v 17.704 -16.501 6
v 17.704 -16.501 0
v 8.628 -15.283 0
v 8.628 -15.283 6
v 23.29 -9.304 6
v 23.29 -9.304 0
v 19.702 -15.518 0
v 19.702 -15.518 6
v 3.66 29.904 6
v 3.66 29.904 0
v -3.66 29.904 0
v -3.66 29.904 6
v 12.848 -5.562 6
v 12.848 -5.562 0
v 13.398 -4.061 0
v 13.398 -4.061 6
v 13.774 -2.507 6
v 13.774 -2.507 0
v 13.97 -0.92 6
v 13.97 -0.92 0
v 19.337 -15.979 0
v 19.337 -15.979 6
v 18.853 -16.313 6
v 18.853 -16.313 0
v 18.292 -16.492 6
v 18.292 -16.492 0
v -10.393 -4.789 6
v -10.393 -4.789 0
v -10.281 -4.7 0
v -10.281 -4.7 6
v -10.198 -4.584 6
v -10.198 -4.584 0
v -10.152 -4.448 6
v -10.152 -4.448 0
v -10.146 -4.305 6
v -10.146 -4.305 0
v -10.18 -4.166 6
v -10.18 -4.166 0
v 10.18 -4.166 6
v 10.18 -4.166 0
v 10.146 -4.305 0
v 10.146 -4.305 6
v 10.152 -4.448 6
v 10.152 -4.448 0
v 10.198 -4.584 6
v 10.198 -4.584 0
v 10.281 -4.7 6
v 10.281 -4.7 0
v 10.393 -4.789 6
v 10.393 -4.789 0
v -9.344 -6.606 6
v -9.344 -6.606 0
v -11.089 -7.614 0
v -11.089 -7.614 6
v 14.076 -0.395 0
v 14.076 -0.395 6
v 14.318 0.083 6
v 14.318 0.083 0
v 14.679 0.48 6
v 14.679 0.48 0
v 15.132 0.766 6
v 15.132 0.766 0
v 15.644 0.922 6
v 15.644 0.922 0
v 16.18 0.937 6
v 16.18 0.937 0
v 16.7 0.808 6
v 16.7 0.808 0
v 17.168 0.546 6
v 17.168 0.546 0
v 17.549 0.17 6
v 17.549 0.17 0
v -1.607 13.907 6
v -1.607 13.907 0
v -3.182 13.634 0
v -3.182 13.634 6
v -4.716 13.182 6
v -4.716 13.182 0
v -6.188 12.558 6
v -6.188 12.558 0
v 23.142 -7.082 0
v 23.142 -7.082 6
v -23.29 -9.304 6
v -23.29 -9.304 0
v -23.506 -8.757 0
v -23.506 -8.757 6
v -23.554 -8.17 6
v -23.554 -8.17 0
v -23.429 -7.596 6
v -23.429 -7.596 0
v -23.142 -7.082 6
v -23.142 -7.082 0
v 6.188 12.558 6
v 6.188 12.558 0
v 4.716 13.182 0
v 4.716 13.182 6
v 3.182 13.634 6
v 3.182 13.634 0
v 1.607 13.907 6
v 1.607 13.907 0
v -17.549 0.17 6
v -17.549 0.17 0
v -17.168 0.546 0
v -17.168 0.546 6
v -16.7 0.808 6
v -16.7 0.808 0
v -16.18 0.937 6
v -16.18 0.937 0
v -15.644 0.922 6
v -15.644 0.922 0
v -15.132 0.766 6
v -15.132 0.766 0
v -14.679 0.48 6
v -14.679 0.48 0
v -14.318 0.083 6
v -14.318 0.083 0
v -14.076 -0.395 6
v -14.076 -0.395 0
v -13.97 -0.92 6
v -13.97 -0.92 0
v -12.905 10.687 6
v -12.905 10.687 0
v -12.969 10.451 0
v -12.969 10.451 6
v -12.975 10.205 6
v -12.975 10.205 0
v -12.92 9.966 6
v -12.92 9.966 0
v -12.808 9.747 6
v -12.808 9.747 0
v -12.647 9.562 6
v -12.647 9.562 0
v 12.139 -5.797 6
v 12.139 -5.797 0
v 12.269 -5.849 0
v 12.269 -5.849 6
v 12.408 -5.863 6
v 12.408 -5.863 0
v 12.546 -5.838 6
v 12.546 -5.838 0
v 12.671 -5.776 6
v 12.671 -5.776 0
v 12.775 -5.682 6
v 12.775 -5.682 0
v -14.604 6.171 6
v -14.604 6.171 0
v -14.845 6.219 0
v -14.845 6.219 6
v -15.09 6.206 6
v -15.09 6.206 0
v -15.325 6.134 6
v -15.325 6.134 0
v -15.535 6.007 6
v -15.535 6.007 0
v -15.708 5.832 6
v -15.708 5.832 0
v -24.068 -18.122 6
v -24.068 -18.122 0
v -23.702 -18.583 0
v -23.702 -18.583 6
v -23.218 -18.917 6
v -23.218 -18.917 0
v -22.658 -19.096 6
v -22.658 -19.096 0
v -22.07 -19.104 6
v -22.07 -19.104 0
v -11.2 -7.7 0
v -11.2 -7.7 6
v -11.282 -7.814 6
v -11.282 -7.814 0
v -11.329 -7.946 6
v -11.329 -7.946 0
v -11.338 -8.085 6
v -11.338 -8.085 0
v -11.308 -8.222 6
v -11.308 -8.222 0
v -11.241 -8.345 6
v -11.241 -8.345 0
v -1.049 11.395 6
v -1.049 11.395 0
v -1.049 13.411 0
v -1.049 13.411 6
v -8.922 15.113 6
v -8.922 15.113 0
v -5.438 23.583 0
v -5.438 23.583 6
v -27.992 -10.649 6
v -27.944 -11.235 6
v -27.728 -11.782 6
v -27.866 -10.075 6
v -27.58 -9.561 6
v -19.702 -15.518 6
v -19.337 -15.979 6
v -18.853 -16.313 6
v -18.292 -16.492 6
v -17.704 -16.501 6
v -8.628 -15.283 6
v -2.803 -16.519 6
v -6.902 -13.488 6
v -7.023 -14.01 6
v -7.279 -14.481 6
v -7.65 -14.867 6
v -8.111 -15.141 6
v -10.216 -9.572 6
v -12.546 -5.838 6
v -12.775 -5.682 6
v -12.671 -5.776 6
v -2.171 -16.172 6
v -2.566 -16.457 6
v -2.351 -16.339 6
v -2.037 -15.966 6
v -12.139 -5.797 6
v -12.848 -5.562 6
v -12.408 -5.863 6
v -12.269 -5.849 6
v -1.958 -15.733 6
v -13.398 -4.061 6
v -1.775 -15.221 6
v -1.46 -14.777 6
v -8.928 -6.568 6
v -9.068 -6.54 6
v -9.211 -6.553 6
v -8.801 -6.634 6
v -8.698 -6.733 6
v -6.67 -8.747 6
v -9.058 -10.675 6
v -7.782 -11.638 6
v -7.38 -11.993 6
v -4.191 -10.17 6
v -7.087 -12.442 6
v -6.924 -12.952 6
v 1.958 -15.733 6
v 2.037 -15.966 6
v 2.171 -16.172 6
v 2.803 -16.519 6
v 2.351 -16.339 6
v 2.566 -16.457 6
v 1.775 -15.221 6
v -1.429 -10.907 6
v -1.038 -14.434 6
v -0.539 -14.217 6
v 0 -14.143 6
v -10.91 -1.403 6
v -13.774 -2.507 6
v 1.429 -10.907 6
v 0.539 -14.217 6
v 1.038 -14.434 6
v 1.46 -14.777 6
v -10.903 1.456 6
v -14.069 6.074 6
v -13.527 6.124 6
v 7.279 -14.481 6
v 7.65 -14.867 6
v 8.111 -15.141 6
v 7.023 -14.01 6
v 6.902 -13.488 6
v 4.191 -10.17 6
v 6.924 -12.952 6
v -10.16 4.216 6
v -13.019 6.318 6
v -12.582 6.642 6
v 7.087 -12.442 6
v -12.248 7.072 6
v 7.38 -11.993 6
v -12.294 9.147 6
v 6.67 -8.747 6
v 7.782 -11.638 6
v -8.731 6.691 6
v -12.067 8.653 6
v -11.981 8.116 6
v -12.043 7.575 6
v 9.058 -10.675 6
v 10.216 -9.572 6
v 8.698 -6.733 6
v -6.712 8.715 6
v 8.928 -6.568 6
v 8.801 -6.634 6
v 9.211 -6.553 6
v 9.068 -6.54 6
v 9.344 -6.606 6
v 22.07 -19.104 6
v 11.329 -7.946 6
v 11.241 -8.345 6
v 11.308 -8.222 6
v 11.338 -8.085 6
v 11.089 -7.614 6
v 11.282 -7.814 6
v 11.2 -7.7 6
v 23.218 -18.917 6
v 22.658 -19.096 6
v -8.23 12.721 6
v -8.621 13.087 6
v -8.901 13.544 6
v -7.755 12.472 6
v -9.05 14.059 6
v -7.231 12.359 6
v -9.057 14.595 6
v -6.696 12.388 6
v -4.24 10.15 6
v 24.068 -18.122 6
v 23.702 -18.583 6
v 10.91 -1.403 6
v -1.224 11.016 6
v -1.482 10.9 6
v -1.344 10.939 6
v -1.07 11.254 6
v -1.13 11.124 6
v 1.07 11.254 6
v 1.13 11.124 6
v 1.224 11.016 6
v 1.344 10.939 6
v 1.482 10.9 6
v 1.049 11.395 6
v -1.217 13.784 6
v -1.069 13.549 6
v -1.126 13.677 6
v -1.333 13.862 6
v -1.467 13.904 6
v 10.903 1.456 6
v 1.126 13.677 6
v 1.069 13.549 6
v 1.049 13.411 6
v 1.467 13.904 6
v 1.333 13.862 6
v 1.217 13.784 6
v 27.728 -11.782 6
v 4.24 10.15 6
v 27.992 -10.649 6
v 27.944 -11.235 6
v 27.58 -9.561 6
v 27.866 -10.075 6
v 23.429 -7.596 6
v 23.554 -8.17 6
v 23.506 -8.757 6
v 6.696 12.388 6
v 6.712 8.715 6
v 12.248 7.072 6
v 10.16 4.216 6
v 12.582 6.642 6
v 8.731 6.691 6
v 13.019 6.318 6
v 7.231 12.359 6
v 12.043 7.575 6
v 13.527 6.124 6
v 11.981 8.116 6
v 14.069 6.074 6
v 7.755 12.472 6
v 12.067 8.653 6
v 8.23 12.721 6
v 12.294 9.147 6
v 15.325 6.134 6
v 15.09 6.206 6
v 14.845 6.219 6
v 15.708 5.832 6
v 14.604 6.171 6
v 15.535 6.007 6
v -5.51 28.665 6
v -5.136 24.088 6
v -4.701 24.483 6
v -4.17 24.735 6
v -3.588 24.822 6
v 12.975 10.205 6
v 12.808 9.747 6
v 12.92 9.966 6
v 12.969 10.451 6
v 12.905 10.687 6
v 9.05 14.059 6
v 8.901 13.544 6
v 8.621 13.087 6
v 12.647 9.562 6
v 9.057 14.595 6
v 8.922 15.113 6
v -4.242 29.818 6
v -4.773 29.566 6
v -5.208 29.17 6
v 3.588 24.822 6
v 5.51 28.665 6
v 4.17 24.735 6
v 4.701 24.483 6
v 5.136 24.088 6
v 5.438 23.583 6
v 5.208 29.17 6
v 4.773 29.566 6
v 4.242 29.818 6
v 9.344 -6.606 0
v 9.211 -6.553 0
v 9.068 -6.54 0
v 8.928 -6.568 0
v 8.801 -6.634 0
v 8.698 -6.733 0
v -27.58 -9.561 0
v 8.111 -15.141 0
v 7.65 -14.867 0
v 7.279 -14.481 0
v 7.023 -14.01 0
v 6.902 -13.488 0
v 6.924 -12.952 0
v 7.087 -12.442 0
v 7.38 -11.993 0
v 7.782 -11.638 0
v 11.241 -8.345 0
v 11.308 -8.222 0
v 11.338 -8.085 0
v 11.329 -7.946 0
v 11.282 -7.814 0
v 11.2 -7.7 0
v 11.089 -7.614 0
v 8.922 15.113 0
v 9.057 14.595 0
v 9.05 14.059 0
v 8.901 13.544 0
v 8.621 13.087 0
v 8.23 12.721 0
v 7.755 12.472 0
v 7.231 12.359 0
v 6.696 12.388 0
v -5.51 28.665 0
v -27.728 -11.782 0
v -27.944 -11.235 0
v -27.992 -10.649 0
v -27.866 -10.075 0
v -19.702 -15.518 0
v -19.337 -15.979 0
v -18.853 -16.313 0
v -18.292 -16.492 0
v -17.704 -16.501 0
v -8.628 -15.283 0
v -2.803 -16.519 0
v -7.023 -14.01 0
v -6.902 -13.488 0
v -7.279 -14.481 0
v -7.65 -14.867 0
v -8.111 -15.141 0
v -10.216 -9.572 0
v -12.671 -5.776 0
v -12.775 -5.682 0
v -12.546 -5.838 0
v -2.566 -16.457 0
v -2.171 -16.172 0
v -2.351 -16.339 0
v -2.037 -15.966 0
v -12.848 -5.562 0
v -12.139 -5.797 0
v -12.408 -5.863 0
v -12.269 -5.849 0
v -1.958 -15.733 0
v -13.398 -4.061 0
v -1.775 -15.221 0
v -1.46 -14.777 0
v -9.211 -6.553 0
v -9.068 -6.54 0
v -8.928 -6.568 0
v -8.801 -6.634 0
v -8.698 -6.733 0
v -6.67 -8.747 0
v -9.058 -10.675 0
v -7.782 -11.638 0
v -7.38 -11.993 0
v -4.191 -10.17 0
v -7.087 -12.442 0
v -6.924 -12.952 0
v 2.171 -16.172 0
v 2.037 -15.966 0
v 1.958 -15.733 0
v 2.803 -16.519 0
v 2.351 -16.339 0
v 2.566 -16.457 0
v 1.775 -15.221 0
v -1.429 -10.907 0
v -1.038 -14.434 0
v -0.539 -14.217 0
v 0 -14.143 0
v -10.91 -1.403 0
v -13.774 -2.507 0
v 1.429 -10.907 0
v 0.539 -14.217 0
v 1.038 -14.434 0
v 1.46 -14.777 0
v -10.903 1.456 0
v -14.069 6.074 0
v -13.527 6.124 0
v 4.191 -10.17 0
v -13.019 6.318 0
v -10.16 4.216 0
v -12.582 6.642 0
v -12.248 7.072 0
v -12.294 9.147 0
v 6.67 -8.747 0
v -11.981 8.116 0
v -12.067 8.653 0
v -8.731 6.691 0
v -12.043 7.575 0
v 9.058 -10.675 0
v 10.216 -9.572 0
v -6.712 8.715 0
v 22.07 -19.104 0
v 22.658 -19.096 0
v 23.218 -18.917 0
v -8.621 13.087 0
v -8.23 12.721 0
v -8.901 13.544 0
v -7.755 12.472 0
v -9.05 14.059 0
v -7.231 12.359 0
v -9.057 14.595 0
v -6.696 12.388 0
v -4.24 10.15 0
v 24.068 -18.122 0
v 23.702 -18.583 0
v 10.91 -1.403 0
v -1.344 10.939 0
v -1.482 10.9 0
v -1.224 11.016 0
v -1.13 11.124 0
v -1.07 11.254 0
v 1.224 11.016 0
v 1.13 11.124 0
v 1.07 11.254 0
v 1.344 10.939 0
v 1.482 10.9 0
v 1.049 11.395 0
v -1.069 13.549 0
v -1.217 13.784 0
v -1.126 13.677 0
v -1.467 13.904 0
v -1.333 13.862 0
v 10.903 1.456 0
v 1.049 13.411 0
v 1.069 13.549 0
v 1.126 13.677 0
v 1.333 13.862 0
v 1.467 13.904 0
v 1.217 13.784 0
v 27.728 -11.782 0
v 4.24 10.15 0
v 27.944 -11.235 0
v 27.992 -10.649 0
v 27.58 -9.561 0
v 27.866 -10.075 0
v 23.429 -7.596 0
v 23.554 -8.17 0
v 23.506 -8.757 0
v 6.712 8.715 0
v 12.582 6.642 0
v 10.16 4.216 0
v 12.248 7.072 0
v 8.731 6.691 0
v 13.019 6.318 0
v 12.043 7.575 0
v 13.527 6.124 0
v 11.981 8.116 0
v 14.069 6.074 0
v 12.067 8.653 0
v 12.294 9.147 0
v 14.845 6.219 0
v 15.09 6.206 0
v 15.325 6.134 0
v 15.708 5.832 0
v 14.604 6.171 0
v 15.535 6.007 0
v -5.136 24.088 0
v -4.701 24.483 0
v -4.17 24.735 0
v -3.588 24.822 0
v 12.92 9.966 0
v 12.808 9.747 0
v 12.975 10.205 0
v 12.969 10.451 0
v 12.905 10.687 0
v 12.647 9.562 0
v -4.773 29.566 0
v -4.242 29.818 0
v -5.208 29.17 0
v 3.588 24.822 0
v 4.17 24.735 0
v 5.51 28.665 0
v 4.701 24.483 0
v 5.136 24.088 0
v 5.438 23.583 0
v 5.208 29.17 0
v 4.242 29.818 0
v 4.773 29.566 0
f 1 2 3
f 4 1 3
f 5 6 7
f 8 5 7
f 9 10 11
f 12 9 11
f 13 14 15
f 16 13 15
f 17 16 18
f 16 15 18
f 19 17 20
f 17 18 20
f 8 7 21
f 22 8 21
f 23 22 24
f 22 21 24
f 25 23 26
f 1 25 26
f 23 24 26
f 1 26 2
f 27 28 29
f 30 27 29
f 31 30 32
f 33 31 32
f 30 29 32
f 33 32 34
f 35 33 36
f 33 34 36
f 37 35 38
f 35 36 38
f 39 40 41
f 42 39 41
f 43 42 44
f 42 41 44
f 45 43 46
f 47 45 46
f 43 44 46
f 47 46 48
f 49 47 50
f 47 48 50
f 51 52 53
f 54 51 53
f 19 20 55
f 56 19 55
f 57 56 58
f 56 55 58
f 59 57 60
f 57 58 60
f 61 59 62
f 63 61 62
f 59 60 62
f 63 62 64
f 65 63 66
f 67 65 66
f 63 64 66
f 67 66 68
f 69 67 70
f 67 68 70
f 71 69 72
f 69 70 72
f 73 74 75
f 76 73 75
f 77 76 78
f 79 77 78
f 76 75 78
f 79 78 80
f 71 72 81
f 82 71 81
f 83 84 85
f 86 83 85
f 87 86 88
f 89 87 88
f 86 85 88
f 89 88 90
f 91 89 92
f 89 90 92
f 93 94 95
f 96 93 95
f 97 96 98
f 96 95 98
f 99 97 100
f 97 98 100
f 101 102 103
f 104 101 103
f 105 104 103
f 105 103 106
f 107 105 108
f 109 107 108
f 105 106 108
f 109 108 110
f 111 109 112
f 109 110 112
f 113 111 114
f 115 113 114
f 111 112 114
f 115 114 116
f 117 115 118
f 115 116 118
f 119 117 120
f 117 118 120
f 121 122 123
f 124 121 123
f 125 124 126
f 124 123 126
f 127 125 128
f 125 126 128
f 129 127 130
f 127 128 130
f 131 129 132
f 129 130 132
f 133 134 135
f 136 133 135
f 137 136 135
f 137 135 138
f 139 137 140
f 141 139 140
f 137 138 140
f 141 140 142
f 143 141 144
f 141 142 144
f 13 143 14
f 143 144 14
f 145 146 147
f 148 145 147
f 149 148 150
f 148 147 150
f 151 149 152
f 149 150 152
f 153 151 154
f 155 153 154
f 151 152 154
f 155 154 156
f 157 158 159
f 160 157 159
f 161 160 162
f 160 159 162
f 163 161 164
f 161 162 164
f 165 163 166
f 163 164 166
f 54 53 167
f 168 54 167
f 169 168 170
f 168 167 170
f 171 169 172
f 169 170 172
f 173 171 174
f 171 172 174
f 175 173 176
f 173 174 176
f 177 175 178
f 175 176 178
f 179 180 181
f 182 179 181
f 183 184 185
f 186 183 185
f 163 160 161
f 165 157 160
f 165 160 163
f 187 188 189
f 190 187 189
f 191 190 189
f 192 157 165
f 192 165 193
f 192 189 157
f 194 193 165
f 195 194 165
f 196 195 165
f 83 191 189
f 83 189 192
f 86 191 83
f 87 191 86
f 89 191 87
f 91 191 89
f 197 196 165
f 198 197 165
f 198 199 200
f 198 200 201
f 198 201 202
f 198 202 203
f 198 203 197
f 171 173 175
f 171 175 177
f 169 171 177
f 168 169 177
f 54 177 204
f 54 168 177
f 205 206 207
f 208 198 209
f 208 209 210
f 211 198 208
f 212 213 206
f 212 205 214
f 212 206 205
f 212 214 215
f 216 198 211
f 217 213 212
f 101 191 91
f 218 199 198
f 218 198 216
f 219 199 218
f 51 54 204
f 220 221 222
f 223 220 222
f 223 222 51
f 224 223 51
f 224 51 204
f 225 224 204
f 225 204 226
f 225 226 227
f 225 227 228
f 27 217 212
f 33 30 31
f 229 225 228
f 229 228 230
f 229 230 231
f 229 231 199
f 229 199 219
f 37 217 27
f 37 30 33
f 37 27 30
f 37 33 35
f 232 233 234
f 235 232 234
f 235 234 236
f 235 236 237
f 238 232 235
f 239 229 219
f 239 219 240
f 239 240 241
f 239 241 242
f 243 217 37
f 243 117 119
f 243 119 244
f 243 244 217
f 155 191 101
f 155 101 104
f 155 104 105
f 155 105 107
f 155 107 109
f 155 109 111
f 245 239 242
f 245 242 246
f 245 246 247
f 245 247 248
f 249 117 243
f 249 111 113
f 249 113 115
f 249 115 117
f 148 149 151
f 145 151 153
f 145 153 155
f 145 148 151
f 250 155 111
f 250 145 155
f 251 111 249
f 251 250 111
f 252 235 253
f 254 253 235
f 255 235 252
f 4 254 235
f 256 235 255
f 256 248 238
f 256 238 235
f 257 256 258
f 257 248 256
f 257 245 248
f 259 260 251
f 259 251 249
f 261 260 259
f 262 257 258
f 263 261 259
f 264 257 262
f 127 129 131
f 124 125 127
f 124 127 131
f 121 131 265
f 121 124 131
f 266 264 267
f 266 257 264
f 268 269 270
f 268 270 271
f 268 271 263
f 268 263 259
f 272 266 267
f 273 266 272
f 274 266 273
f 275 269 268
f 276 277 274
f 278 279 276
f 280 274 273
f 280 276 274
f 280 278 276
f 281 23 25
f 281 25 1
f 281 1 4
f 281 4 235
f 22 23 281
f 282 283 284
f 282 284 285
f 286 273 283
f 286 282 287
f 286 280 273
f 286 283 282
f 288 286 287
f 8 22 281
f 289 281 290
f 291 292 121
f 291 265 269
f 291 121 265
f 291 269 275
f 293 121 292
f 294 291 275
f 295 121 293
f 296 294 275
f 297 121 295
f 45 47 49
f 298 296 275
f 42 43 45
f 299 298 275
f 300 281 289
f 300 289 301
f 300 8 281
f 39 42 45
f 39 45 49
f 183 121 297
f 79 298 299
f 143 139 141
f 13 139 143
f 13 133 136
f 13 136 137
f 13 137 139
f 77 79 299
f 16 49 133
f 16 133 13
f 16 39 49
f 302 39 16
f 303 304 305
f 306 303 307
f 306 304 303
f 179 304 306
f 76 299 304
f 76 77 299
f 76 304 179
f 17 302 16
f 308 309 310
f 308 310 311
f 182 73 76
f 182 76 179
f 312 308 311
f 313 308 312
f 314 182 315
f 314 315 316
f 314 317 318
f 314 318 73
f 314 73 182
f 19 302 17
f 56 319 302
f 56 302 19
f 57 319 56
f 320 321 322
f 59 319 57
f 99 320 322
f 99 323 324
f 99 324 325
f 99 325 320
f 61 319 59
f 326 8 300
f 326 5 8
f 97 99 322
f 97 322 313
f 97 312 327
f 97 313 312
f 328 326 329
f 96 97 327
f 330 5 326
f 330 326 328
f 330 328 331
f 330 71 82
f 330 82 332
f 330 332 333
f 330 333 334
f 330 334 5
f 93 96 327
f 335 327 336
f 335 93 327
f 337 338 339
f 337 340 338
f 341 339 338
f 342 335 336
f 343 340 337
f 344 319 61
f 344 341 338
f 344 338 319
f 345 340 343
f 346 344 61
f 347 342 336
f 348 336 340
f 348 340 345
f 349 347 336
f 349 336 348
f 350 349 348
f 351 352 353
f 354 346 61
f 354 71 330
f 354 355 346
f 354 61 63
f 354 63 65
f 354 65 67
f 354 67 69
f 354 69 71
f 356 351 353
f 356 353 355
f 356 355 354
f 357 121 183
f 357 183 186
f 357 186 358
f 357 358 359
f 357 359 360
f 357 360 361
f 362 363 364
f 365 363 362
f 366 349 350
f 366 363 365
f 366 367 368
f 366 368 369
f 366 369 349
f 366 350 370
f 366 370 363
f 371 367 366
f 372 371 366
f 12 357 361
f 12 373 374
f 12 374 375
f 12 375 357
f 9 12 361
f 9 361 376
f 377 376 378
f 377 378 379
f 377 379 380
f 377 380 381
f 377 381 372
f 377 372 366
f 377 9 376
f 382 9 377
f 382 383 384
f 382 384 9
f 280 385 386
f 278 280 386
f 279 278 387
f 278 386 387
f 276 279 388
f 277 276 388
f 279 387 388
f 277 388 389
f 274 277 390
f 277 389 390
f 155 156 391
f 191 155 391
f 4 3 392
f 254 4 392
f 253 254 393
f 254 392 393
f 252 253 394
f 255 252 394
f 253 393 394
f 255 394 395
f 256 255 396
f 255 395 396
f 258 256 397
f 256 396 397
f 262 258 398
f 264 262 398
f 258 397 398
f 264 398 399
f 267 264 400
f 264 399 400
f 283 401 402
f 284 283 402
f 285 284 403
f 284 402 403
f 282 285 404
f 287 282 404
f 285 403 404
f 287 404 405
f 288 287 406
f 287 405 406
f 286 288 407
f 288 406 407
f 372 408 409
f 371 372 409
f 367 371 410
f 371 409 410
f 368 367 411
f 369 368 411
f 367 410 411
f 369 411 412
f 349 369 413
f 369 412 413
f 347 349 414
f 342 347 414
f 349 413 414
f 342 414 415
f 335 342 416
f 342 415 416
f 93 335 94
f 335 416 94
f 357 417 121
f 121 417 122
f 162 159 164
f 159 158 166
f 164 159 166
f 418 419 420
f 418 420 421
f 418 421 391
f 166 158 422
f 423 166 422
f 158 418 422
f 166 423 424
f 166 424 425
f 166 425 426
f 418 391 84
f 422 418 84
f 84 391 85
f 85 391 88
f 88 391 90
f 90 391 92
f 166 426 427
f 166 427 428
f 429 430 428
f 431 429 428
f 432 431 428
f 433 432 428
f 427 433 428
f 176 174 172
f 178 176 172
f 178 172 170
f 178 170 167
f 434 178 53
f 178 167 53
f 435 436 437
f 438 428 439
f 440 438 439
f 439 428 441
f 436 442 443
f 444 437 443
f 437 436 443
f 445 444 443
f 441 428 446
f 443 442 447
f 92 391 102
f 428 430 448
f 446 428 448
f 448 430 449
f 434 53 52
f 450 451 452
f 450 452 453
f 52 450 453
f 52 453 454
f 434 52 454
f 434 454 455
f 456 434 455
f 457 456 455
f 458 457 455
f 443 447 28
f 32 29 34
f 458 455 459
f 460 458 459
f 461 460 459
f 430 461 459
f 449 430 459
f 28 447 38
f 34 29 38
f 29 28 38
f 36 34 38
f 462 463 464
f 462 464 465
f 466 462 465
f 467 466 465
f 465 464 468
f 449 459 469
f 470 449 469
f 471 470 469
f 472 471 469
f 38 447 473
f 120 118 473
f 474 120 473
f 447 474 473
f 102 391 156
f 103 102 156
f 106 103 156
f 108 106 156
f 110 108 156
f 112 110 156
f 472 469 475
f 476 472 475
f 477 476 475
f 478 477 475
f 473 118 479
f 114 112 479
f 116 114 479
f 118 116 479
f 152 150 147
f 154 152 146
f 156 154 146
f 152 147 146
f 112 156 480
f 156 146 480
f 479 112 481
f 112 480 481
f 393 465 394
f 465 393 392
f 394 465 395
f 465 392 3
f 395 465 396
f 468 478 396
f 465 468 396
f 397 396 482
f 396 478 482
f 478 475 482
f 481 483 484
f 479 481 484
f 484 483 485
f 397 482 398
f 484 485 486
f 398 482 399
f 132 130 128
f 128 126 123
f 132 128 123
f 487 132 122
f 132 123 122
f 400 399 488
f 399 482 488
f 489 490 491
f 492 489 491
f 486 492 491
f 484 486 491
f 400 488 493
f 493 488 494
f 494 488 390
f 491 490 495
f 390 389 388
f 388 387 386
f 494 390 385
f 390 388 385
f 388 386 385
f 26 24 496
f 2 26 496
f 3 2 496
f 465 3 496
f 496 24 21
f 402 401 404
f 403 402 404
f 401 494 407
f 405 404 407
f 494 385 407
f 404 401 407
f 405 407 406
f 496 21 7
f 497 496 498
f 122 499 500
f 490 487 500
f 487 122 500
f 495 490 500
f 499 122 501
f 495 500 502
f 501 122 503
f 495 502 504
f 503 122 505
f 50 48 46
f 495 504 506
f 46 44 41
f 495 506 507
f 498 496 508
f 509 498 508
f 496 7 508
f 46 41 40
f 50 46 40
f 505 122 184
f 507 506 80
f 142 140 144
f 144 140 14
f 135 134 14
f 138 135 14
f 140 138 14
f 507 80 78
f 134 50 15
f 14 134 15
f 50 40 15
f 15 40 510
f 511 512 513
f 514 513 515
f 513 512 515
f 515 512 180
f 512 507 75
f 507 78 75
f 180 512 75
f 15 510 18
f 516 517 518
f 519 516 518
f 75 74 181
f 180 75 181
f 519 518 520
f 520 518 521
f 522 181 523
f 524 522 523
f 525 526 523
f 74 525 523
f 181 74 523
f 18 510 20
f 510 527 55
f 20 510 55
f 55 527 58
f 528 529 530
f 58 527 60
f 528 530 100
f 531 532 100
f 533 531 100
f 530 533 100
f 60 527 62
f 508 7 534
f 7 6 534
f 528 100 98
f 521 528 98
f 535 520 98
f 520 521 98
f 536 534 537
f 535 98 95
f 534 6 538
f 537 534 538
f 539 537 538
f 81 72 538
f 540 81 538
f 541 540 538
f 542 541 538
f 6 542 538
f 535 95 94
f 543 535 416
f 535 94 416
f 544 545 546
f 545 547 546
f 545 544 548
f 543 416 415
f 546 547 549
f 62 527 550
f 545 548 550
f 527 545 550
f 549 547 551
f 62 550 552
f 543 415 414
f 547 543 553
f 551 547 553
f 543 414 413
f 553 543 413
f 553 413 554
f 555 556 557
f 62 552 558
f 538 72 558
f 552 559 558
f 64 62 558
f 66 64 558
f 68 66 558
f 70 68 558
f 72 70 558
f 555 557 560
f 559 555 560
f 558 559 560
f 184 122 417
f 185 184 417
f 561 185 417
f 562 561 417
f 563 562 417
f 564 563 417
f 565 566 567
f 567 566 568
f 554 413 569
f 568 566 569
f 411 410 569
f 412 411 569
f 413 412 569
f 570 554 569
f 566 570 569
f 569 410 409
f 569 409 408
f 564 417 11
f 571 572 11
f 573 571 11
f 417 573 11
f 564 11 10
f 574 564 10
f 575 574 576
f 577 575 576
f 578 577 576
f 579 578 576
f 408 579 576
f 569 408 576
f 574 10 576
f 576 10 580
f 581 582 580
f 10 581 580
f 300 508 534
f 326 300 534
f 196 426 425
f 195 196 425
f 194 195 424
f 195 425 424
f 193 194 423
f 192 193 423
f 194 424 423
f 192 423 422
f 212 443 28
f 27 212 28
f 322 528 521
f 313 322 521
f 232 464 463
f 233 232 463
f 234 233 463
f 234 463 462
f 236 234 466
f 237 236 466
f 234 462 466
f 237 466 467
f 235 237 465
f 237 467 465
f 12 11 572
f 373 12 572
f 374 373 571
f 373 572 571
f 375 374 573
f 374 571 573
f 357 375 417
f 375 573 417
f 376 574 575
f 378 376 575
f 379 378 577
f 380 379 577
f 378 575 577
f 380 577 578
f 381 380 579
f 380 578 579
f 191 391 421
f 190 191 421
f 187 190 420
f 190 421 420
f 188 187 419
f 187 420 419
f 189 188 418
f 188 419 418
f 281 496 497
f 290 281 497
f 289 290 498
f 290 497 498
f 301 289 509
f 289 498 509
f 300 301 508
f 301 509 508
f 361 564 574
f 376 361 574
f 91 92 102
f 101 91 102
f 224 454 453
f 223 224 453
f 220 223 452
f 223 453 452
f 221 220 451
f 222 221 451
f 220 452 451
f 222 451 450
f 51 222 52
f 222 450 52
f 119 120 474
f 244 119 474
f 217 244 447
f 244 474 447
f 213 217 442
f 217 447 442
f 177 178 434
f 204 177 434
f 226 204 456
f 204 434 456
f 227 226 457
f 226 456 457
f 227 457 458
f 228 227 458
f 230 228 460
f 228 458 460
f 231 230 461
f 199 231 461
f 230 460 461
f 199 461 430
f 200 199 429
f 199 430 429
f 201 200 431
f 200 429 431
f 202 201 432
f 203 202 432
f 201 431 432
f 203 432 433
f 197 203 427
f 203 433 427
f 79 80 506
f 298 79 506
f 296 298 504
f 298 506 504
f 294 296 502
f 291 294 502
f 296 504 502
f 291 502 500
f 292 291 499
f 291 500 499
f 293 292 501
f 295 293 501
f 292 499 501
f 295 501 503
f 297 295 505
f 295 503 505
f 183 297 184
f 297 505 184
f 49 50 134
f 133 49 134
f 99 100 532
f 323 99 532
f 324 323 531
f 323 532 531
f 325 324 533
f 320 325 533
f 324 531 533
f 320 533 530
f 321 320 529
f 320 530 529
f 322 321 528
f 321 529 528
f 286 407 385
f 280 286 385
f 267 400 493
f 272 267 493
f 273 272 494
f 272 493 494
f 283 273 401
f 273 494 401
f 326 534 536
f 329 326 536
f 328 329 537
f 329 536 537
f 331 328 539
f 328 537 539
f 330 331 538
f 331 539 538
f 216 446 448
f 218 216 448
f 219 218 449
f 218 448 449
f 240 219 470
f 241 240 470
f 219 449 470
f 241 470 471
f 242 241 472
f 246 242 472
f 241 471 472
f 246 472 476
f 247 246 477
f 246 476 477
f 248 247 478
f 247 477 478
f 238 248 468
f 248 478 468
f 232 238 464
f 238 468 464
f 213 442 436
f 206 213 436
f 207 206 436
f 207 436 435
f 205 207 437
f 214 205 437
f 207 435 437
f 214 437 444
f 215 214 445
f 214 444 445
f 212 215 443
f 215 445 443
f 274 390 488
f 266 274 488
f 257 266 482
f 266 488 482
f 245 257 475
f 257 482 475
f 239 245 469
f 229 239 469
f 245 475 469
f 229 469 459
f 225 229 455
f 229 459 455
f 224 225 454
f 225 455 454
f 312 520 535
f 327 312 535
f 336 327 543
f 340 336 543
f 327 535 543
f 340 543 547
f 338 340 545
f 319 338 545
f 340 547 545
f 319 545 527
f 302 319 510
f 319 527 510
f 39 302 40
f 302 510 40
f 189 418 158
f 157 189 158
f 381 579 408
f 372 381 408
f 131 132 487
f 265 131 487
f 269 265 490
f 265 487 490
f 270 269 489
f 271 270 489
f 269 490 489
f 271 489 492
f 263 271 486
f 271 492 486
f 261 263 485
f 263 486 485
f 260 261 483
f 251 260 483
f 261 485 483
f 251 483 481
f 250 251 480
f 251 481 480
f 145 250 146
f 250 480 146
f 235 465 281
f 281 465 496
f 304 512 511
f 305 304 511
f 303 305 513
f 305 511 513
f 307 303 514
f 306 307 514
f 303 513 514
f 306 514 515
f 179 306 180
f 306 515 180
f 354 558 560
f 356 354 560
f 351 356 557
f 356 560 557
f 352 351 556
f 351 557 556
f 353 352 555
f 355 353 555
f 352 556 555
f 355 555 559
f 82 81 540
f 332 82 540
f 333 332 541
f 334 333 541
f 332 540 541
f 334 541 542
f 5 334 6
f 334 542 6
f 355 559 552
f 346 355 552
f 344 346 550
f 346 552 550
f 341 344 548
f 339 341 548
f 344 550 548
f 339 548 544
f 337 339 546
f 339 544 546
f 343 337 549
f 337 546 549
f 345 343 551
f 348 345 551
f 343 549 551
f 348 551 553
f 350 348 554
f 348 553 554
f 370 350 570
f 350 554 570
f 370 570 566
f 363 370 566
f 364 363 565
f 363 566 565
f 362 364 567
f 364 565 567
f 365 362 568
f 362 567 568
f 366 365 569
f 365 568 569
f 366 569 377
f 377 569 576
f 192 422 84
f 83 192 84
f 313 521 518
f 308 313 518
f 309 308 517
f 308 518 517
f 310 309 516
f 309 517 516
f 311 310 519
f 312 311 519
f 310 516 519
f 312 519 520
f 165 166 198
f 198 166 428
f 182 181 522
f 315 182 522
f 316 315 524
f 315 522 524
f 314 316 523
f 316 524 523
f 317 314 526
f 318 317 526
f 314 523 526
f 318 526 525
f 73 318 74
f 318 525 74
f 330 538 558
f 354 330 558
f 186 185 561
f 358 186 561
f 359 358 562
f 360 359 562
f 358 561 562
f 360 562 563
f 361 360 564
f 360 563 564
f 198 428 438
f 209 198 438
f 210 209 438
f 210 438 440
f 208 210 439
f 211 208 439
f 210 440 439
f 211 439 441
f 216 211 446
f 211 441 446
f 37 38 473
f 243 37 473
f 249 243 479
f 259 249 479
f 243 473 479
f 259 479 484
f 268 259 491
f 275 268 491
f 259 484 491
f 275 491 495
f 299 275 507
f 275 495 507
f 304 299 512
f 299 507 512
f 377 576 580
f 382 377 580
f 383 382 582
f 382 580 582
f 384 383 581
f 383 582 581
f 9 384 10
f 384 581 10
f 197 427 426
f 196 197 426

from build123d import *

# Parameters (mm, degrees)
F1_DEPTH = 6


with BuildPart() as f1:
    # F0 (on Top) → F1 (new body)
    with BuildSketch(Plane.XY):
        with BuildLine():
            Line((3.66008, 29.904429), (-3.66008, 29.904429))
            ThreePointArc((-3.66008, 29.904429), (-4.773266, 29.566), (-5.509717, 28.665246))
            Line((-5.509717, 28.665246), (-12.904586, 10.687453))
            ThreePointArc((-12.904586, 10.687453), (-12.954508, 10.083702), (-12.646693, 9.56192))
            ThreePointArc((-12.646693, 9.56192), (-12.248494, 7.071671), (-14.604212, 6.171398))
            ThreePointArc((-14.604212, 6.171398), (-15.209996, 6.177082), (-15.707898, 5.831973))
            Line((-15.707898, 5.831973), (-27.57969, -9.561068))
            ThreePointArc((-27.57969, -9.561068), (-27.99154, -10.64923), (-27.728035, -11.782492))
            Line((-27.728035, -11.782492), (-24.067955, -18.121937))
            ThreePointArc((-24.067955, -18.121937), (-23.218274, -18.916769), (-22.069973, -19.104178))
            Line((-22.069973, -19.104178), (-2.803313, -16.519426))
            ThreePointArc((-2.803313, -16.519426), (-2.255488, -16.260784), (-1.957519, -15.733317))
            ThreePointArc((-1.957519, -15.733317), (0, -14.143342), (1.957519, -15.733317))
            ThreePointArc((1.957519, -15.733317), (2.255488, -16.260784), (2.803313, -16.519426))
            Line((2.803313, -16.519426), (22.069973, -19.104178))
            ThreePointArc((22.069973, -19.104178), (23.218274, -18.916769), (24.067955, -18.121937))
            Line((24.067955, -18.121937), (27.728035, -11.782492))
            ThreePointArc((27.728035, -11.782492), (27.99154, -10.64923), (27.57969, -9.561068))
            Line((27.57969, -9.561068), (15.707898, 5.831973))
            ThreePointArc((15.707898, 5.831973), (15.209996, 6.177082), (14.604212, 6.171398))
            ThreePointArc((14.604212, 6.171398), (12.248494, 7.071671), (12.646693, 9.56192))
            ThreePointArc((12.646693, 9.56192), (12.954508, 10.083702), (12.904586, 10.687453))
            Line((12.904586, 10.687453), (5.509717, 28.665246))
            ThreePointArc((5.509717, 28.665246), (4.773266, 29.566), (3.66008, 29.904429))
        make_face()
        with BuildLine():
            ThreePointArc((-10.180424, -4.16641), (-9.526279, 5.5), (-1.481994, 10.899711))
            ThreePointArc((-1.481994, 10.899711), (-1.17274, 11.066276), (-1.049358, 11.395152))
            Line((-1.049358, 11.395152), (-1.049358, 13.410798))
            ThreePointArc((-1.049358, 13.410798), (-1.216711, 13.784088), (-1.606741, 13.907494))
            ThreePointArc((-1.606741, 13.907494), (-3.955309, 13.429651), (-6.187959, 12.558231))
            ThreePointArc((-6.187959, 12.558231), (-8.437578, 12.891077), (-8.92159, 15.113082))
            Line((-8.92159, 15.113082), (-5.437741, 23.582728))
            ThreePointArc((-5.437741, 23.582728), (-4.701289, 24.483481), (-3.588104, 24.82191))
            Line((-3.588104, 24.82191), (3.588104, 24.82191))
            ThreePointArc((3.588104, 24.82191), (4.701289, 24.483481), (5.437741, 23.582728))
            Line((5.437741, 23.582728), (8.92159, 15.113082))
            ThreePointArc((8.92159, 15.113082), (8.437578, 12.891077), (6.187959, 12.558231))
            ThreePointArc((6.187959, 12.558231), (3.955309, 13.429651), (1.606741, 13.907494))
            ThreePointArc((1.606741, 13.907494), (1.216711, 13.784088), (1.049358, 13.410798))
            Line((1.049358, 13.410798), (1.049358, 11.395152))
            ThreePointArc((1.049358, 11.395152), (1.17274, 11.066276), (1.481994, 10.899711))
            ThreePointArc((1.481994, 10.899711), (9.526279, 5.5), (10.180424, -4.16641))
            ThreePointArc((10.180424, -4.16641), (10.170047, -4.517515), (10.39317, -4.788805))
            Line((10.39317, -4.788805), (12.13877, -5.796628))
            ThreePointArc((12.13877, -5.796628), (12.545726, -5.838342), (12.847614, -5.562268))
            ThreePointArc((12.847614, -5.562268), (13.608073, -3.289428), (13.969726, -0.920186))
            ThreePointArc((13.969726, -0.920186), (15.382789, 0.861619), (17.549107, 0.169783))
            Line((17.549107, 0.169783), (23.142112, -7.082143))
            ThreePointArc((23.142112, -7.082143), (23.553962, -8.170305), (23.290457, -9.303566))
            Line((23.290457, -9.303566), (19.702353, -15.518344))
            ThreePointArc((19.702353, -15.518344), (18.852672, -16.313177), (17.704371, -16.500586))
            Line((17.704371, -16.500586), (8.627518, -15.282864))
            ThreePointArc((8.627518, -15.282864), (6.945211, -13.752695), (7.781768, -11.638045))
            ThreePointArc((7.781768, -11.638045), (9.652765, -10.140223), (11.240872, -8.345226))
            ThreePointArc((11.240872, -8.345226), (11.329015, -7.945747), (11.089412, -7.614169))
            Line((11.089412, -7.614169), (9.343812, -6.606347))
            ThreePointArc((9.343812, -6.606347), (8.997306, -6.548761), (8.698429, -6.7333))
            ThreePointArc((8.698429, -6.7333), (0, -11), (-8.698429, -6.7333))
            ThreePointArc((-8.698429, -6.7333), (-8.997306, -6.548761), (-9.343812, -6.606347))
            Line((-9.343812, -6.606347), (-11.089412, -7.614169))
            ThreePointArc((-11.089412, -7.614169), (-11.329015, -7.945747), (-11.240872, -8.345226))
            ThreePointArc((-11.240872, -8.345226), (-9.652765, -10.140223), (-7.781768, -11.638045))
            ThreePointArc((-7.781768, -11.638045), (-6.945211, -13.752695), (-8.627518, -15.282864))
            Line((-8.627518, -15.282864), (-17.704371, -16.500586))
            ThreePointArc((-17.704371, -16.500586), (-18.852672, -16.313177), (-19.702353, -15.518344))
            Line((-19.702353, -15.518344), (-23.290457, -9.303566))
            ThreePointArc((-23.290457, -9.303566), (-23.553962, -8.170305), (-23.142112, -7.082143))
            Line((-23.142112, -7.082143), (-17.549107, 0.169783))
            ThreePointArc((-17.549107, 0.169783), (-15.382789, 0.861619), (-13.969726, -0.920186))
            ThreePointArc((-13.969726, -0.920186), (-13.608073, -3.289428), (-12.847614, -5.562268))
            ThreePointArc((-12.847614, -5.562268), (-12.545726, -5.838342), (-12.13877, -5.796628))
            Line((-12.13877, -5.796628), (-10.39317, -4.788805))
            ThreePointArc((-10.39317, -4.788805), (-10.170047, -4.517515), (-10.180424, -4.16641))
        make_face(mode=Mode.SUBTRACT)
    extrude(amount=F1_DEPTH)


solid = f1.part
